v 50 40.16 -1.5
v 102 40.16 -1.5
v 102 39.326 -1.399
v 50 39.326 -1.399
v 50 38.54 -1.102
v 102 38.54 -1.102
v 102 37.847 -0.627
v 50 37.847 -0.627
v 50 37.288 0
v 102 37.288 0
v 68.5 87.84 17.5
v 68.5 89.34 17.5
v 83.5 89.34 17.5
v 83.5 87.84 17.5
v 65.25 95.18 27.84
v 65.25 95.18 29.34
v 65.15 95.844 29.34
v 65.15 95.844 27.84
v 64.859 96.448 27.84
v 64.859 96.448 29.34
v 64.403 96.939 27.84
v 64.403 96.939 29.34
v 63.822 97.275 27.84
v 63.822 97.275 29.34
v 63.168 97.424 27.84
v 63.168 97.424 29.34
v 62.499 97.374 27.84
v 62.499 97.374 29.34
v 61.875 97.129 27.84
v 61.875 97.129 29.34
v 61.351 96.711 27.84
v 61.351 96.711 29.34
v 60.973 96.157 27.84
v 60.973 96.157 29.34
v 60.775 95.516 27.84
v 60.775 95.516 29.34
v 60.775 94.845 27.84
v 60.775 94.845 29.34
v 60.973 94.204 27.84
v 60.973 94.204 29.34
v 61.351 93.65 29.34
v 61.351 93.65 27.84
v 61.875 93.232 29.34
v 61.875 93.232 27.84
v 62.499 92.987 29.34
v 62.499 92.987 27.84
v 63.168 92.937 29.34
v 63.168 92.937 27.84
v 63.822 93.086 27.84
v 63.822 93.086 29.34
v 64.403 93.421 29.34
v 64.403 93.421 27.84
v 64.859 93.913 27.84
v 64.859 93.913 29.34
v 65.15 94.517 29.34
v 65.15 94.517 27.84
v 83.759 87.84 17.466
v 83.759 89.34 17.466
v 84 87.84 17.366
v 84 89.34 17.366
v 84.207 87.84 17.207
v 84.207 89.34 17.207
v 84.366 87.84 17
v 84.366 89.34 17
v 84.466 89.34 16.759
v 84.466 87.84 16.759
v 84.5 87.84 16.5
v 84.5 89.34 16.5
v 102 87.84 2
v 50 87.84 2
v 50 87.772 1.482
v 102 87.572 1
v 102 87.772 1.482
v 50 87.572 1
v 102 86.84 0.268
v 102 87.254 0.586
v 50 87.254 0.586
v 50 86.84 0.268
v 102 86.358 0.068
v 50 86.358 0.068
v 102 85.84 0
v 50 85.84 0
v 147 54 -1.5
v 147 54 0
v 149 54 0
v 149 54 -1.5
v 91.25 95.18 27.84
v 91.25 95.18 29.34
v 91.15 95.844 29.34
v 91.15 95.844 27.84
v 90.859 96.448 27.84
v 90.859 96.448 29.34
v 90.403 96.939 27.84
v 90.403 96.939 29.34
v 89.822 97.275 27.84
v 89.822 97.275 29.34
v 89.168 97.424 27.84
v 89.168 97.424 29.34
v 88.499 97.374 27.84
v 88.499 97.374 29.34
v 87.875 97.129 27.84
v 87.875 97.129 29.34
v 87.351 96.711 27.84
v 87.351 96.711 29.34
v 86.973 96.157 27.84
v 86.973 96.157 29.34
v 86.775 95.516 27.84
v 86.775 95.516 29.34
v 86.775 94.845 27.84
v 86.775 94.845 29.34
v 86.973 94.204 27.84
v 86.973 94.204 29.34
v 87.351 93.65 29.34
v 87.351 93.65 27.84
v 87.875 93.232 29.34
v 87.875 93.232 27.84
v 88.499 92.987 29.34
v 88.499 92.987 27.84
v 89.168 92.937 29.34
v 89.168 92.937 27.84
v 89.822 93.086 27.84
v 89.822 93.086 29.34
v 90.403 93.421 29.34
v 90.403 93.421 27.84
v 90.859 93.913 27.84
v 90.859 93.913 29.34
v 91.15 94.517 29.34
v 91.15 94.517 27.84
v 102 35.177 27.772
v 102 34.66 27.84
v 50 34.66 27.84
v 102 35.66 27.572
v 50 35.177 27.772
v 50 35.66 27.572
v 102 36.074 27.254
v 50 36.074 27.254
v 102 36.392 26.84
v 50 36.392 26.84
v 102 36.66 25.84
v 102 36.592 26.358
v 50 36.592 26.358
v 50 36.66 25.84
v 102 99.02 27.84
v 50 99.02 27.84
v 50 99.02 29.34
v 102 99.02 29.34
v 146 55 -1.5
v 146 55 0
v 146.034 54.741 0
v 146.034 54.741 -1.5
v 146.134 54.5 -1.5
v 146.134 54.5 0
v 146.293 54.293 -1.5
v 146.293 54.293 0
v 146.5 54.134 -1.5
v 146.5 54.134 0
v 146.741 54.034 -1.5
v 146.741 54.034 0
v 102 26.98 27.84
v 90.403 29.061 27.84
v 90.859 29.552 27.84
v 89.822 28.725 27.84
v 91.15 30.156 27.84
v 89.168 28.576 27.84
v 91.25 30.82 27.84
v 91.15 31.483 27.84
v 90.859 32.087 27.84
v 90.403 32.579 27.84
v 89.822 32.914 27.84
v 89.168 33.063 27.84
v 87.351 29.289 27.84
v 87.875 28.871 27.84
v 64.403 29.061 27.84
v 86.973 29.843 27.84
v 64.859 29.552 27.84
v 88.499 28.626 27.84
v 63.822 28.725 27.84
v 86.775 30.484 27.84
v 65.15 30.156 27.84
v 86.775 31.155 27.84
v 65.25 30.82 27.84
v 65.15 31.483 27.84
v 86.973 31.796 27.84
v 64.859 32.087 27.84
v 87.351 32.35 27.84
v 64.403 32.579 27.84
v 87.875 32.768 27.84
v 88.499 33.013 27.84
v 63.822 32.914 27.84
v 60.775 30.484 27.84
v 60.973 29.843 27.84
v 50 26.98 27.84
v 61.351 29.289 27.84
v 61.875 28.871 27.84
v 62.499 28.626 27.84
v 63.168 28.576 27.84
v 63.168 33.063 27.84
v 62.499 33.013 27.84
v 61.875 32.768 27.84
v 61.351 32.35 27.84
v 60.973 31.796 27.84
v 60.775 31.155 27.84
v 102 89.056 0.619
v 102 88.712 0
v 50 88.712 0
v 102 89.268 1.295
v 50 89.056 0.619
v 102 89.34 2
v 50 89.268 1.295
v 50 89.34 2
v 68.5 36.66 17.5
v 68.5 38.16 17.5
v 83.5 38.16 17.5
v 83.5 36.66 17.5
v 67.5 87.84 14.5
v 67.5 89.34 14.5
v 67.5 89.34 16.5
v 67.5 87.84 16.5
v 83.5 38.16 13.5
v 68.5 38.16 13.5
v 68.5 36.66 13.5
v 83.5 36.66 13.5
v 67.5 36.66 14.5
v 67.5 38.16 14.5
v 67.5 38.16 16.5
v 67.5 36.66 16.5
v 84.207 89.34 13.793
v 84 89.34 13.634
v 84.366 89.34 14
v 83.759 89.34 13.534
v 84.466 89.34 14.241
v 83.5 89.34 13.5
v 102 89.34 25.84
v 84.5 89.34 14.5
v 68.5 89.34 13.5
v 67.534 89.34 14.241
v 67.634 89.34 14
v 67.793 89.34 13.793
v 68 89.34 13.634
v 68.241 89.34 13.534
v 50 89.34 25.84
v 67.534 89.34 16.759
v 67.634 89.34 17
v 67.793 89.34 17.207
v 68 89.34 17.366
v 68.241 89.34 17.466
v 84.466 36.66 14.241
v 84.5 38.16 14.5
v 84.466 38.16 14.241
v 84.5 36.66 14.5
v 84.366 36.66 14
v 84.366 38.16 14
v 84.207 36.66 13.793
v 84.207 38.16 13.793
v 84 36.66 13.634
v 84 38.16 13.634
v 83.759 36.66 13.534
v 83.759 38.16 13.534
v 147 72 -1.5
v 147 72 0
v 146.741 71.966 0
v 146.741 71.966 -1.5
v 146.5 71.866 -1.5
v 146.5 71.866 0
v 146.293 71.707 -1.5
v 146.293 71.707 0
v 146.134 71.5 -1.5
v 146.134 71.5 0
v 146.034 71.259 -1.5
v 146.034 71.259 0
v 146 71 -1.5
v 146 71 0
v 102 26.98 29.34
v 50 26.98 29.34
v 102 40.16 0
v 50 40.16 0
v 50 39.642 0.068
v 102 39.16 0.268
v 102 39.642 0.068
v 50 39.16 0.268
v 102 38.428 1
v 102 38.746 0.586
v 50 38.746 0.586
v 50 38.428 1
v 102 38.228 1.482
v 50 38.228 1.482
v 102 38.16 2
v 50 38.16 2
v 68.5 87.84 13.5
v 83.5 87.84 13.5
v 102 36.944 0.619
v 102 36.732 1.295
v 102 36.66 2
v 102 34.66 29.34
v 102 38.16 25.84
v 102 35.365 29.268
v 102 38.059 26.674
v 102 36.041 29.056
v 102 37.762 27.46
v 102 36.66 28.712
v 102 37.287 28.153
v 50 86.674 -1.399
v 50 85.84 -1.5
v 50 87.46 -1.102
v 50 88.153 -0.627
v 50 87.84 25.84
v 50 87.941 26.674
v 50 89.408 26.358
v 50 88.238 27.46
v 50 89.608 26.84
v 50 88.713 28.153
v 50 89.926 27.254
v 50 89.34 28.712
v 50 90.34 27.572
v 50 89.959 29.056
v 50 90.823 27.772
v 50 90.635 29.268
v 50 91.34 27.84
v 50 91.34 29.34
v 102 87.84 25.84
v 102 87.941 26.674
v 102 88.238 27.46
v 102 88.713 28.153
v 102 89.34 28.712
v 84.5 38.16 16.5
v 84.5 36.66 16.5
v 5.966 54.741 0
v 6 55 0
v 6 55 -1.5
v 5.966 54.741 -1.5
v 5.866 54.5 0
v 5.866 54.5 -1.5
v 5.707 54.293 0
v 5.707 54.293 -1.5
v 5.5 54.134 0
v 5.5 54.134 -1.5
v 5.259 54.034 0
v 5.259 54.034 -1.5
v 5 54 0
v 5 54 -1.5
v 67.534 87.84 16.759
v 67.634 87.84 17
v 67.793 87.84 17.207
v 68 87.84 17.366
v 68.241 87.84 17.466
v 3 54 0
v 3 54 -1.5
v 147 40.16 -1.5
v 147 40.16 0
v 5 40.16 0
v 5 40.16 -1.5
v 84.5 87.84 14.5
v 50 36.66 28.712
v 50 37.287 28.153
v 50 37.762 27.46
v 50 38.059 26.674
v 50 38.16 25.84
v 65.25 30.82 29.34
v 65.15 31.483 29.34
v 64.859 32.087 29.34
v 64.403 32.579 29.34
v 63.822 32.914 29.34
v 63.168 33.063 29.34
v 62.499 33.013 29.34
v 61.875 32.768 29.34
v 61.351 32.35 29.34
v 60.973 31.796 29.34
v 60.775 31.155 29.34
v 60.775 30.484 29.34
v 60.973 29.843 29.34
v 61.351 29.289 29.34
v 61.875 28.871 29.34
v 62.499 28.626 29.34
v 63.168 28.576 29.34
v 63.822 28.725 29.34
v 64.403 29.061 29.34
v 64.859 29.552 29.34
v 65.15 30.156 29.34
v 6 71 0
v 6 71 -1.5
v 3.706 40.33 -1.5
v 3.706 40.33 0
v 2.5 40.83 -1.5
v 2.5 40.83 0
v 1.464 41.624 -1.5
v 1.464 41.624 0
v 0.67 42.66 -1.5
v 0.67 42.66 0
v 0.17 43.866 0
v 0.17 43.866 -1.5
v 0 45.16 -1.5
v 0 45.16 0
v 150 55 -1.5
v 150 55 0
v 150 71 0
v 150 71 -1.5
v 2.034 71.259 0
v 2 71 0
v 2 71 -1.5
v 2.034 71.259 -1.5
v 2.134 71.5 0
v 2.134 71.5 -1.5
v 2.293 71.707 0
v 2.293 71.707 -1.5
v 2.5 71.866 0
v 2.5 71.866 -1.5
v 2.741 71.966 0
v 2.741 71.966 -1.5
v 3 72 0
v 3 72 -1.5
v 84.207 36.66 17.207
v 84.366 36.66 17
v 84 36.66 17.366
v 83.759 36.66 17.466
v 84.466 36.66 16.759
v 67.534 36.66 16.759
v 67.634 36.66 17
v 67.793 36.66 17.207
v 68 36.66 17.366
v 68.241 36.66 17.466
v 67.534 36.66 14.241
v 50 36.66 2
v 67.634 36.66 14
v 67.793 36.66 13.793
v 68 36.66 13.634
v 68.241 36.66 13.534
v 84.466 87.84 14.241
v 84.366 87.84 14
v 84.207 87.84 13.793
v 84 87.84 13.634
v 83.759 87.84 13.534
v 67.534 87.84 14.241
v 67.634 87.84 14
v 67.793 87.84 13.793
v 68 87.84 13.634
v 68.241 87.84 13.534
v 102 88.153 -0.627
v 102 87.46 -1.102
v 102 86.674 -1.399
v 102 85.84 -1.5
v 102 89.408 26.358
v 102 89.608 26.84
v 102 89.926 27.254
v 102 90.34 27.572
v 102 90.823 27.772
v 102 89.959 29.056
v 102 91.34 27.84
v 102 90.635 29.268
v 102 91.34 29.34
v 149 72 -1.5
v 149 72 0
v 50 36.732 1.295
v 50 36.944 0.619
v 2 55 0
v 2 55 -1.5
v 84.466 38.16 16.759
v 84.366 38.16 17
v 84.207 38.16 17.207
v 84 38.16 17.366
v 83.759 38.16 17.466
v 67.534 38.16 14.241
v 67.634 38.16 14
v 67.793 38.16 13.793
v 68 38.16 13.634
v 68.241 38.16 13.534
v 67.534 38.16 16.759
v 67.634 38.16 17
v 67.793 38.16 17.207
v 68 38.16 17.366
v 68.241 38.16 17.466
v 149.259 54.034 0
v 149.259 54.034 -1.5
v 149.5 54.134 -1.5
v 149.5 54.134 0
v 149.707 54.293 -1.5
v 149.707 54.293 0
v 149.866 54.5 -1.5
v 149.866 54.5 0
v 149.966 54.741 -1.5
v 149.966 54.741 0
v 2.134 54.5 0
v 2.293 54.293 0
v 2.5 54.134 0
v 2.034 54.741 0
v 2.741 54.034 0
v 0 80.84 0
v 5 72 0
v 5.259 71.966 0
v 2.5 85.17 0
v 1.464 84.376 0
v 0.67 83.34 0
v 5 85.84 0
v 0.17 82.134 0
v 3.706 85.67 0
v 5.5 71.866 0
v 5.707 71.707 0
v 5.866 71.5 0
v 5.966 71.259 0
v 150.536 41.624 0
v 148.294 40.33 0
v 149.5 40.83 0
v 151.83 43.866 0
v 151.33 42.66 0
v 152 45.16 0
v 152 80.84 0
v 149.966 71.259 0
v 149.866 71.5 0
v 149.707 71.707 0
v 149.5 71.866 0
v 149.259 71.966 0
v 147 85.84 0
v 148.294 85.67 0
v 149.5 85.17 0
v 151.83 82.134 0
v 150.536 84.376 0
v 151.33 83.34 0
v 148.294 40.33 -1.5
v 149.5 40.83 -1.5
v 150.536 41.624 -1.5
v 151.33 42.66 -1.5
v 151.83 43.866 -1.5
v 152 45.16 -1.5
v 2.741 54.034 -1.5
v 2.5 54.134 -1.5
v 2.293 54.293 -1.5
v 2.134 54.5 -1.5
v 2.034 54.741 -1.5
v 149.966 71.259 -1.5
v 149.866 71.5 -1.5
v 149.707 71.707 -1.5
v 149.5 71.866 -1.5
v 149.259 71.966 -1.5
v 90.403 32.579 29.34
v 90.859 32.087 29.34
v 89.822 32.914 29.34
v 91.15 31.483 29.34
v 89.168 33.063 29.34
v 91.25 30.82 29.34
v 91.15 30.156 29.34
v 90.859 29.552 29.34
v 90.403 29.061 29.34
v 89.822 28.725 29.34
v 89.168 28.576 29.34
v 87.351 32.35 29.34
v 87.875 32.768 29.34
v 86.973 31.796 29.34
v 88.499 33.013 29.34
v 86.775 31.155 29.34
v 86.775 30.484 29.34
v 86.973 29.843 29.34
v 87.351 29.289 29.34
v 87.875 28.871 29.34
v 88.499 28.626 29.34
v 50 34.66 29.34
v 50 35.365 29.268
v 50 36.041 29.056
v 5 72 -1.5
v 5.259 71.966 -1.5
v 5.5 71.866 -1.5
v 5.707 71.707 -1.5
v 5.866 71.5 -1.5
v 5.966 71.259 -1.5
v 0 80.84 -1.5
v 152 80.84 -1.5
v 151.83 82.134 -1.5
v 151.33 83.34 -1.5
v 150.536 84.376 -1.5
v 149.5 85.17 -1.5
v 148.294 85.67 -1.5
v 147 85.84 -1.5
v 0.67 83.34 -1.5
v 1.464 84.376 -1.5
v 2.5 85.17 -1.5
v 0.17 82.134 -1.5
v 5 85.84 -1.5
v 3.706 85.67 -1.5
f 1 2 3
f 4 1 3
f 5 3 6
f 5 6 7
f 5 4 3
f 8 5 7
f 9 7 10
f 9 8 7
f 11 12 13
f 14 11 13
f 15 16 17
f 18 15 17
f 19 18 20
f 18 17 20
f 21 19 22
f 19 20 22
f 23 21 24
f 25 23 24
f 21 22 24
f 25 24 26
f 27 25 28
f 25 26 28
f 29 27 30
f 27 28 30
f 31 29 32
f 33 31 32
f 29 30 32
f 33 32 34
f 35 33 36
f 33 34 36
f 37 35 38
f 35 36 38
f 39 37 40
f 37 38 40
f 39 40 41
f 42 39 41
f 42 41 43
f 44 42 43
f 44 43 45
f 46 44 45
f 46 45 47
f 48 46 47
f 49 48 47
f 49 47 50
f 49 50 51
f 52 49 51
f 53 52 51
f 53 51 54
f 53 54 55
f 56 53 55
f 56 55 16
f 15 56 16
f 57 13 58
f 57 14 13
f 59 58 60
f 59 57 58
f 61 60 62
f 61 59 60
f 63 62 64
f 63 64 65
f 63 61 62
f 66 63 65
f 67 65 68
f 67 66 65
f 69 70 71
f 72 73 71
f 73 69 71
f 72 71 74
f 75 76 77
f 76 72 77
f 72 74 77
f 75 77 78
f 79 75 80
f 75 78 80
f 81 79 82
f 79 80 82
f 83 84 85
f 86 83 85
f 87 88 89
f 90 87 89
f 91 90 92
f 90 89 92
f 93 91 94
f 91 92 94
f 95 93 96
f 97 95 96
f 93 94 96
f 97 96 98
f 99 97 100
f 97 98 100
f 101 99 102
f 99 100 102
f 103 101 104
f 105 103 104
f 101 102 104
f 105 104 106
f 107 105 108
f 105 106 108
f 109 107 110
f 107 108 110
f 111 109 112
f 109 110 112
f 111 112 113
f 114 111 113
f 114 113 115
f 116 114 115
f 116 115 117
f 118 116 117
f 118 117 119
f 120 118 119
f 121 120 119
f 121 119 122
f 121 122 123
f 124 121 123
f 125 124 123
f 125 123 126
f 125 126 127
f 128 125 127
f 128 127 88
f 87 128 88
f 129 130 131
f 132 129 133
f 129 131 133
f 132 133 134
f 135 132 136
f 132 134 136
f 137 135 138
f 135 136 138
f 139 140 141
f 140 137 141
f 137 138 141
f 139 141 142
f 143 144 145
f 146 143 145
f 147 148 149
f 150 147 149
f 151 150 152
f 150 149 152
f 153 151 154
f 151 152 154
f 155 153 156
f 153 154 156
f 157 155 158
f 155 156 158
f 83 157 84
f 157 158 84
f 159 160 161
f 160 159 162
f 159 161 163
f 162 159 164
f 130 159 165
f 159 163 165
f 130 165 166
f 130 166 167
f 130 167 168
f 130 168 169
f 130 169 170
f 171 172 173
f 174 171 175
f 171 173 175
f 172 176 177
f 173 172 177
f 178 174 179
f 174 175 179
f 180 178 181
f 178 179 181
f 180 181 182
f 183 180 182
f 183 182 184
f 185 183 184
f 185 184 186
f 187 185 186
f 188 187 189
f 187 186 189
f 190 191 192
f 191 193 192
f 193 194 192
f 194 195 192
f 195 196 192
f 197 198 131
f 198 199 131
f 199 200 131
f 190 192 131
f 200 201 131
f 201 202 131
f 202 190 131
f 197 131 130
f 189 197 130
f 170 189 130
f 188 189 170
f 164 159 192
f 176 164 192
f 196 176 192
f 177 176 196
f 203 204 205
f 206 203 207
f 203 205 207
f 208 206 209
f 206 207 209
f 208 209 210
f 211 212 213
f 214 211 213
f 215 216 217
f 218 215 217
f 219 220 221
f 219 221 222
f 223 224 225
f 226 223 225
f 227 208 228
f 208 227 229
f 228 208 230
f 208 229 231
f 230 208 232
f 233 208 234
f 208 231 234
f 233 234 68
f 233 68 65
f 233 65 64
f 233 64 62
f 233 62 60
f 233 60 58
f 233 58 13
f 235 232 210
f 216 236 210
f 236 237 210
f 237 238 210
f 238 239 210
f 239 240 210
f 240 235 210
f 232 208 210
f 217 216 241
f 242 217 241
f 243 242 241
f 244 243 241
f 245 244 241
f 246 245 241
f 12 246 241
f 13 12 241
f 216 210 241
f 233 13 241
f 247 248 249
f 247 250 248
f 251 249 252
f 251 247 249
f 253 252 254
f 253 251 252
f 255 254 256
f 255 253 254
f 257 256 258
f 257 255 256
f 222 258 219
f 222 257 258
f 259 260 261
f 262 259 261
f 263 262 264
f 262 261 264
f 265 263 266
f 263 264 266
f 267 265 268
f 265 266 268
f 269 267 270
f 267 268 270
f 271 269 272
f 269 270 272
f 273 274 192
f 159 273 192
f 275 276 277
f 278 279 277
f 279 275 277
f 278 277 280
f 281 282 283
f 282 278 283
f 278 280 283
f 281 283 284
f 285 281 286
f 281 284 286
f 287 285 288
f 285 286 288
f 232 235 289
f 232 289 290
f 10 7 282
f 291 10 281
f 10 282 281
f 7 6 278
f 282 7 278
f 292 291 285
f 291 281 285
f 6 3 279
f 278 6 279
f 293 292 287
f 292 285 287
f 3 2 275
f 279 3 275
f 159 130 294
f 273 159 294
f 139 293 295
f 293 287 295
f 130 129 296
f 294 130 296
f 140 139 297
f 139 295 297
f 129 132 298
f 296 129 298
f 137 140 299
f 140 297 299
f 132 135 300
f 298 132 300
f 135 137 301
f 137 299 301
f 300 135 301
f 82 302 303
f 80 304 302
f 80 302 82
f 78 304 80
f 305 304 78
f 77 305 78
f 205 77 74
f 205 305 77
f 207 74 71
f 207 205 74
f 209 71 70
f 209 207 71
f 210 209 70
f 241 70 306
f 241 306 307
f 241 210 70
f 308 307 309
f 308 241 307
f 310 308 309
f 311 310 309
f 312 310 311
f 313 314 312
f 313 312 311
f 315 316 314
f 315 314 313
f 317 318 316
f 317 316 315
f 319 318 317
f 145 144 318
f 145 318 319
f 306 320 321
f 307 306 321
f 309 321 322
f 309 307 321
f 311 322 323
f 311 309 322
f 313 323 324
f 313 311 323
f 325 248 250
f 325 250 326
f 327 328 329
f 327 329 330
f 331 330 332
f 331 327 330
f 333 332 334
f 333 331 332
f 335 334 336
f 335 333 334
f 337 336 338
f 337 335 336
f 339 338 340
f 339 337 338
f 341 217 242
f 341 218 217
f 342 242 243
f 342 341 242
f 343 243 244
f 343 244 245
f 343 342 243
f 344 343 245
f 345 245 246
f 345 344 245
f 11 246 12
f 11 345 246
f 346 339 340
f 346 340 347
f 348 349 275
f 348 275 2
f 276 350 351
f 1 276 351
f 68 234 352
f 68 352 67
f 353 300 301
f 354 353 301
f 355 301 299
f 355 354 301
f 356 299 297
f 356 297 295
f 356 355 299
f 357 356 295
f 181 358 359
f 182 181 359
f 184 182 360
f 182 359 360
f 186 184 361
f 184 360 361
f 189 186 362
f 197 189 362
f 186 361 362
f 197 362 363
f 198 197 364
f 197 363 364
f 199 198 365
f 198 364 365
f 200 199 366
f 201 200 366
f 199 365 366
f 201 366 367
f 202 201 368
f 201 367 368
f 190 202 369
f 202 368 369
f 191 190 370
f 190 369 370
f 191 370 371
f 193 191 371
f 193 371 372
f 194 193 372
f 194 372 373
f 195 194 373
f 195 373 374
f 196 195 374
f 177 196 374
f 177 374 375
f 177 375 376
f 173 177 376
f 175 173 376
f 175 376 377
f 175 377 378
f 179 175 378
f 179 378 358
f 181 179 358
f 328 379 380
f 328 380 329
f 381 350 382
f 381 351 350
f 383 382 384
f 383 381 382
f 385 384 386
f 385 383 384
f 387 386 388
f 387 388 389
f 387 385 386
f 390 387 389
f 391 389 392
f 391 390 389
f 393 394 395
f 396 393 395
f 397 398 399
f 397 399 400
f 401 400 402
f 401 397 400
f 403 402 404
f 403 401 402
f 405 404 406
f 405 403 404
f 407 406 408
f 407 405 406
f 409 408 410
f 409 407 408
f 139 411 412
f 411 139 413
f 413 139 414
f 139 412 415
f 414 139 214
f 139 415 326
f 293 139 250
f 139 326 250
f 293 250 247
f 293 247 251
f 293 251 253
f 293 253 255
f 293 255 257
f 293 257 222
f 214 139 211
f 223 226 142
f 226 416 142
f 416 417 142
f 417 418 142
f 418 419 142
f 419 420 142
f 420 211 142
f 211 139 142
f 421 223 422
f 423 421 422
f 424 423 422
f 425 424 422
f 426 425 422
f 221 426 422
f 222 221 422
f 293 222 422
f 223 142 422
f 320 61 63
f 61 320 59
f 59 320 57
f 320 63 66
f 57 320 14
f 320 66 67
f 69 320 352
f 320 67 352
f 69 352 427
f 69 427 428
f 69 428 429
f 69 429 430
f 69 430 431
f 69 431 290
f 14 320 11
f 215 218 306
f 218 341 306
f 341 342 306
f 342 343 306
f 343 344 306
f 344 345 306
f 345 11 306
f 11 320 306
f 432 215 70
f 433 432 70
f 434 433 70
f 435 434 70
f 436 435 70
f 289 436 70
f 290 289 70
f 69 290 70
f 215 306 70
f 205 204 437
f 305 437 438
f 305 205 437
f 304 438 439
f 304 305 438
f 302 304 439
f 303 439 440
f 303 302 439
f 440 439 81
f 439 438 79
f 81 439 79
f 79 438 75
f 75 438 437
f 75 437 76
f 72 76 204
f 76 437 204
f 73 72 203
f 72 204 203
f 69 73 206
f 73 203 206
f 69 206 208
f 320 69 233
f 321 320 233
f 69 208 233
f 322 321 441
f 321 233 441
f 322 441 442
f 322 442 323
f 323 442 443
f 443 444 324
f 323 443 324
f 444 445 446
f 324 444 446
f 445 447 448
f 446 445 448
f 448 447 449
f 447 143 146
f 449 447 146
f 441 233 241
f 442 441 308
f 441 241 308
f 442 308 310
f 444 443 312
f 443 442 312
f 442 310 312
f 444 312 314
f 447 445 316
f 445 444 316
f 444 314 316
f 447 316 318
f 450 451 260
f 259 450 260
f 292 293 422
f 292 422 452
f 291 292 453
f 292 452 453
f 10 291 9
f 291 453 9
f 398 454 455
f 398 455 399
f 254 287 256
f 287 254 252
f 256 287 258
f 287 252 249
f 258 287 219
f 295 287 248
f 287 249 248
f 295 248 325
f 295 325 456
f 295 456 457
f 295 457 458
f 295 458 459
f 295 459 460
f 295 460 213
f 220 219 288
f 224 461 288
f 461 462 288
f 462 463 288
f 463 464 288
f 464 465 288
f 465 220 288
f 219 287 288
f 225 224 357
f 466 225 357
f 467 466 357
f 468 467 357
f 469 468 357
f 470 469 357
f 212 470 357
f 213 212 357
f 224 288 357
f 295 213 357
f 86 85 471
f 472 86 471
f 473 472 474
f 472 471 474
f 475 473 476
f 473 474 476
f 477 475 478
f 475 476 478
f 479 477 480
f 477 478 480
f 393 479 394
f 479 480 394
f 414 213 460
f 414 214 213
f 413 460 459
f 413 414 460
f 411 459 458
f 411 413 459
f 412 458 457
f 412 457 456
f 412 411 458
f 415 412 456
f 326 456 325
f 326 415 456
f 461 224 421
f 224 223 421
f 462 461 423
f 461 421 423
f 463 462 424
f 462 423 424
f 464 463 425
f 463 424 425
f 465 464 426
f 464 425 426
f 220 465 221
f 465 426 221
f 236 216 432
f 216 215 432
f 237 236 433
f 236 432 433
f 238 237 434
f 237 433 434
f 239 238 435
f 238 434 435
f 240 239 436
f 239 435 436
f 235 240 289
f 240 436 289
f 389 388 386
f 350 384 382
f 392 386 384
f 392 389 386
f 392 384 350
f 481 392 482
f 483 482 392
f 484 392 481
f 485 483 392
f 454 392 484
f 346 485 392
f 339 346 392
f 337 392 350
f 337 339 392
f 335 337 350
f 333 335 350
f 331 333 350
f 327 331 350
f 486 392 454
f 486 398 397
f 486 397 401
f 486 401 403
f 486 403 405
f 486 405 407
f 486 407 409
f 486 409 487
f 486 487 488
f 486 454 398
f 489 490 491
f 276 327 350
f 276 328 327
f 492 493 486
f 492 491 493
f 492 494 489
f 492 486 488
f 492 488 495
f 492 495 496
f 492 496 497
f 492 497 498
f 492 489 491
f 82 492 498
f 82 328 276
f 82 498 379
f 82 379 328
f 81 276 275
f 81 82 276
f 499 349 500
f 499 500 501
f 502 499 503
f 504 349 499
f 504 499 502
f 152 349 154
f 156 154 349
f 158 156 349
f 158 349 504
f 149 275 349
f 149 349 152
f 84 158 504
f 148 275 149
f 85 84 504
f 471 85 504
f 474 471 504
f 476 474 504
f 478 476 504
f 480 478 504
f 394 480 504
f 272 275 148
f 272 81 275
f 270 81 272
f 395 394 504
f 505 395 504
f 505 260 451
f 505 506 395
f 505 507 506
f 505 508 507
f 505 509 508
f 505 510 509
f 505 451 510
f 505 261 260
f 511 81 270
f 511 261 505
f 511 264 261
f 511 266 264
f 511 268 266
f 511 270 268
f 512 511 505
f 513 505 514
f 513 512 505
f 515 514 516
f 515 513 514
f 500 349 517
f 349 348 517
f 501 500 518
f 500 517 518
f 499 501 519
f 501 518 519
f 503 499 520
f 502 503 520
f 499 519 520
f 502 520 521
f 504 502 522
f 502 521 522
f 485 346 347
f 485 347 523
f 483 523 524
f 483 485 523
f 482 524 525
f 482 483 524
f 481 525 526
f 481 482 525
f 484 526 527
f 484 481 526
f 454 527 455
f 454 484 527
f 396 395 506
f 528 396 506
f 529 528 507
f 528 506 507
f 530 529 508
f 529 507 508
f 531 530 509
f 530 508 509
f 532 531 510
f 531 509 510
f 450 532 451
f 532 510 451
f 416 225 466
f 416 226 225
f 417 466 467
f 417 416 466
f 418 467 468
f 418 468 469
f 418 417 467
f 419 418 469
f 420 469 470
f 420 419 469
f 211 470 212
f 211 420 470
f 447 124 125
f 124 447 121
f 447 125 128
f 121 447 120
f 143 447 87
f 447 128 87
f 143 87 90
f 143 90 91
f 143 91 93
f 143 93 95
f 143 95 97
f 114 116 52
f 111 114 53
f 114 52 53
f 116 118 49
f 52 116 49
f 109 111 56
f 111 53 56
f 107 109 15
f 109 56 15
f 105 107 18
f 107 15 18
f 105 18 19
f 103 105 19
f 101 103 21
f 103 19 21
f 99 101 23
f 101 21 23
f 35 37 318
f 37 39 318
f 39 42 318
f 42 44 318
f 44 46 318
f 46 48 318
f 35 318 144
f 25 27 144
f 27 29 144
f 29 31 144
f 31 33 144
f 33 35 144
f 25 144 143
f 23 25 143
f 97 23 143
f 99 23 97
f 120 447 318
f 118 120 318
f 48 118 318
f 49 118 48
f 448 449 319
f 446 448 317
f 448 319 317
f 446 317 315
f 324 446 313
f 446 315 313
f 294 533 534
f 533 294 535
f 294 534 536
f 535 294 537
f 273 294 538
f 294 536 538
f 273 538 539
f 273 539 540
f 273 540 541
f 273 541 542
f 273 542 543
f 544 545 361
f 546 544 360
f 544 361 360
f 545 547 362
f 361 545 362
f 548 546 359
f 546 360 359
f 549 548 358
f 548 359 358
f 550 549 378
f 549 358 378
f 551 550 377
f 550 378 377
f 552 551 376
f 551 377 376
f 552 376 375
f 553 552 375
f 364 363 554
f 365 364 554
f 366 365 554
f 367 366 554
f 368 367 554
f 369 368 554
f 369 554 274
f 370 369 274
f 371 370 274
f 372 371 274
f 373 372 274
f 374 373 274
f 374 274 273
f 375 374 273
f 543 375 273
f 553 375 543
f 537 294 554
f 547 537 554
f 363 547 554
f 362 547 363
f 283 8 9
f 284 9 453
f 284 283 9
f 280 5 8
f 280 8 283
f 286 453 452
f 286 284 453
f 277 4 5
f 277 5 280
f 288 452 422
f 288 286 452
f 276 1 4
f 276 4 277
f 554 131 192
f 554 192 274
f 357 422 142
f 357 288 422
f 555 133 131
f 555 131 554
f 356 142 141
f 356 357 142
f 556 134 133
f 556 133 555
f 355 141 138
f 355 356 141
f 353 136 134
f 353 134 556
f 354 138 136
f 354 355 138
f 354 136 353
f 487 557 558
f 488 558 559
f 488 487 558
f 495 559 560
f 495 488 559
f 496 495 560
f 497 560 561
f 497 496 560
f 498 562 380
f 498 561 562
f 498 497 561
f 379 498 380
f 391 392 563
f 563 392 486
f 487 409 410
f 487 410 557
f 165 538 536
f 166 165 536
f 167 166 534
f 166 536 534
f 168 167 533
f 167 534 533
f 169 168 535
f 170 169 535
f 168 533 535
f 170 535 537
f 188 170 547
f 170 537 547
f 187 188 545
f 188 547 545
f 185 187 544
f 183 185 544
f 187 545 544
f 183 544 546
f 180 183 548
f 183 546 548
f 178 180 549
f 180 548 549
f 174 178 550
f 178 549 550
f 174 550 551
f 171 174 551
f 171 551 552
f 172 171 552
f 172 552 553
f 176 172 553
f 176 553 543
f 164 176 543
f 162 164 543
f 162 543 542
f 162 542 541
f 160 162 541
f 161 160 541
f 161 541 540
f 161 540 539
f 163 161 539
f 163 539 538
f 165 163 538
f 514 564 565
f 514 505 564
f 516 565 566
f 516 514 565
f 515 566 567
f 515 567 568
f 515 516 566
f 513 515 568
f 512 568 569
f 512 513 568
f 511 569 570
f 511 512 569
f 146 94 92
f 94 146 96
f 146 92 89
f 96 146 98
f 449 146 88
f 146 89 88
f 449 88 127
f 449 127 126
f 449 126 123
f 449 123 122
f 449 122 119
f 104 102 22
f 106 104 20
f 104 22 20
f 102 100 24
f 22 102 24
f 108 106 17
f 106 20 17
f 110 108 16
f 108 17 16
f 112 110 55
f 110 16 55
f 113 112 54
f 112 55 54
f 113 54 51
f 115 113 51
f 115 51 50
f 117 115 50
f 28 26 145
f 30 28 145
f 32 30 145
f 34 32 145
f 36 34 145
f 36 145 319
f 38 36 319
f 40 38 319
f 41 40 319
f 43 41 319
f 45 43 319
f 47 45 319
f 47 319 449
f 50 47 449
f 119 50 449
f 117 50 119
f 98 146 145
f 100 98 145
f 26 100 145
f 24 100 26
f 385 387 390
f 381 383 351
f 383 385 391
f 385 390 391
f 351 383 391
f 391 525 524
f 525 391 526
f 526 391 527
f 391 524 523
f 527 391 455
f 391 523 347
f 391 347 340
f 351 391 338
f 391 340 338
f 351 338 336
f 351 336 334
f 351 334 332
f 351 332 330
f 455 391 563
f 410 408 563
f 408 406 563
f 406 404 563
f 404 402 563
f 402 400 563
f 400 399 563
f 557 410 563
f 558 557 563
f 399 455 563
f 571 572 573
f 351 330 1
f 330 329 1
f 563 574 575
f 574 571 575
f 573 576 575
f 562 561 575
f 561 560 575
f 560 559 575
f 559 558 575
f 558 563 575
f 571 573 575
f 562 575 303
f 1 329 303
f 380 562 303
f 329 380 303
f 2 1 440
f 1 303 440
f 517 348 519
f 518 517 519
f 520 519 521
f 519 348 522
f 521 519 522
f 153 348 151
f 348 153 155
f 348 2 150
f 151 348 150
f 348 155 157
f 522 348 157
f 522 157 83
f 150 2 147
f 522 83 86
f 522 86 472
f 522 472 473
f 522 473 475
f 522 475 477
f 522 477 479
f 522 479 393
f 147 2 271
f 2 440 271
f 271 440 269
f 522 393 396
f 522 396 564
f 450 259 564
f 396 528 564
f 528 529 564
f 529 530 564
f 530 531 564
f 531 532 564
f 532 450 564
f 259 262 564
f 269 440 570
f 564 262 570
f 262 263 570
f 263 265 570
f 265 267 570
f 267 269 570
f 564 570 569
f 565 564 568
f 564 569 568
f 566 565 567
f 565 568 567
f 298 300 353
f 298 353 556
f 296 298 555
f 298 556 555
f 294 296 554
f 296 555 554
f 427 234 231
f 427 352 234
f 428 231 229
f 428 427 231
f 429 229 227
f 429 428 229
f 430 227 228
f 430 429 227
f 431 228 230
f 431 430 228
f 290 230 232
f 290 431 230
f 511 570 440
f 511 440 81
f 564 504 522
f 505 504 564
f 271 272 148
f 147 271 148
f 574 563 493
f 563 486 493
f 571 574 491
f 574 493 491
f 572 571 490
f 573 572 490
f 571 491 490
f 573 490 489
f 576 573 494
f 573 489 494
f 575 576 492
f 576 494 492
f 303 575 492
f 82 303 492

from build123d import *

# Parameters (mm, degrees)
SKIZZE1_W                            = 152
SKIZZE1_H                            = 126
BASIS_BLECH1_DEPTH                   = 1.5
SKIZZIERTE_BIEGUNG2_DEPTH            = 152
SKIZZIERTE_BIEGUNG2_2_DEPTH          = 152
SKIZZIERTE_BIEGUNG3_DEPTH            = 152
SKIZZIERTE_BIEGUNG3_2_DEPTH          = 152
SKIZZIERTE_BIEGUNG4_DEPTH            = 152
SKIZZIERTE_BIEGUNG4_2_DEPTH          = 152
SCHNITT_LINEAR_AUSTRAGEN1_DEPTH      = 50
SCHNITT_LINEAR_AUSTRAGEN2_DEPTH      = 167.894252898
SCHNITT_LINEAR_AUSTRAGEN2_DEPTH_BACK = 167.894252898
SKIZZE15_W                           = 17
SKIZZE15_H                           = 4
SKIZZE22_R                           = 2.25
SCHNITT_LINEAR_AUSTRAGEN4_DEPTH      = 185.011324876
VERRUNDUNG3_R                        = 1
VERRUNDUNG4_R                        = 5
SCHNITT_LINEAR_AUSTRAGEN5_DEPTH      = 184.765876096


# Read off the part's stored shape, not the designer's step: Skizzierte Biegung2, Skizzierte Biegung3, Skizzierte Biegung4
# Sheet-metal steps are written as plain solids
with BuildPart() as part:
    # Skizze1 → Basis-Blech1 (new body)
    with BuildSketch(Plane.XY):
        with Locations((76, 63)):
            Rectangle(SKIZZE1_W, SKIZZE1_H)
    extrude(amount=-BASIS_BLECH1_DEPTH)

    # Skizzierte Biegung2 outline → Skizzierte Biegung2 (cut)
    with BuildSketch(Plane.YZ):
        with BuildLine():
            ThreePointArc((88.712436374, 0), (87.460340225, -1.102418411), (85.840155051, -1.5))
            Line((85.840155051, -1.5), (126, -1.5))
            Line((126, -1.5), (126, 0))
            Line((126, 0), (88.712436374, 0))
        make_face()
        with BuildLine():
            Line((0, -1.5), (40.159844949, -1.5))
            ThreePointArc((40.159844949, -1.5), (38.539659775, -1.102418411), (37.287563626, 0))
            Line((37.287563626, 0), (0, 0))
            Line((0, 0), (0, -1.5))
        make_face()
    extrude(amount=SKIZZIERTE_BIEGUNG2_DEPTH, mode=Mode.SUBTRACT)

    # Skizzierte Biegung2 2 outline → Skizzierte Biegung2 2 (add)
    with BuildSketch(Plane.YZ):
        with BuildLine():
            Line((85.840155051, 0), (88.712436374, 0))
            ThreePointArc((88.712436374, 0), (89.179540071, 0.951902827), (89.340155051, 2))
            Line((89.340155051, 2), (89.340155051, 37.840155051))
            Line((89.340155051, 37.840155051), (87.840155051, 37.840155051))
            Line((87.840155051, 37.840155051), (87.840155051, 2))
            ThreePointArc((87.840155051, 2), (87.254368613, 0.585786438), (85.840155051, 0))
        make_face()
        with BuildLine():
            ThreePointArc((36.659844949, 2), (36.820459929, 0.951902827), (37.287563626, 0))
            Line((37.287563626, 0), (40.159844949, 0))
            ThreePointArc((40.159844949, 0), (38.745631387, 0.585786438), (38.159844949, 2))
            Line((38.159844949, 2), (38.159844949, 37.840155051))
            Line((38.159844949, 37.840155051), (36.659844949, 37.840155051))
            Line((36.659844949, 37.840155051), (36.659844949, 2))
        make_face()
    extrude(amount=SKIZZIERTE_BIEGUNG2_2_DEPTH)

    # Skizzierte Biegung3 outline → Skizzierte Biegung3 (cut)
    with BuildSketch(Plane.YZ):
        with BuildLine():
            ThreePointArc((87.840155051, 25.840155051), (88.23773664, 27.460340225), (89.340155051, 28.712436374))
            Line((89.340155051, 28.712436374), (89.340155051, 37.840155051))
            Line((89.340155051, 37.840155051), (87.840155051, 37.840155051))
            Line((87.840155051, 37.840155051), (87.840155051, 25.840155051))
        make_face()
    extrude(amount=SKIZZIERTE_BIEGUNG3_DEPTH, mode=Mode.SUBTRACT)

    # Skizzierte Biegung3 2 outline → Skizzierte Biegung3 2 (add)
    with BuildSketch(Plane.YZ):
        with BuildLine():
            ThreePointArc((89.340155051, 25.840155051), (89.925941489, 27.254368613), (91.340155051, 27.840155051))
            Line((91.340155051, 27.840155051), (99.020465152, 27.840155051))
            Line((99.020465152, 27.840155051), (99.020465152, 29.340155051))
            Line((99.020465152, 29.340155051), (91.340155051, 29.340155051))
            ThreePointArc((91.340155051, 29.340155051), (90.292057878, 29.179540071), (89.340155051, 28.712436374))
            Line((89.340155051, 28.712436374), (89.340155051, 25.840155051))
        make_face()
    extrude(amount=SKIZZIERTE_BIEGUNG3_2_DEPTH)

    # Skizzierte Biegung4 outline → Skizzierte Biegung4 (cut)
    with BuildSketch(Plane.YZ):
        with BuildLine():
            Line((36.659844949, 37.840155051), (36.659844949, 28.712436374))
            ThreePointArc((36.659844949, 28.712436374), (37.76226336, 27.460340225), (38.159844949, 25.840155051))
            Line((38.159844949, 25.840155051), (38.159844949, 37.840155051))
            Line((38.159844949, 37.840155051), (36.659844949, 37.840155051))
        make_face()
    extrude(amount=SKIZZIERTE_BIEGUNG4_DEPTH, mode=Mode.SUBTRACT)

    # Skizzierte Biegung4 2 outline → Skizzierte Biegung4 2 (add)
    with BuildSketch(Plane.YZ):
        with BuildLine():
            Line((26.979534848, 29.340155051), (26.979534848, 27.840155051))
            Line((26.979534848, 27.840155051), (34.659844949, 27.840155051))
            ThreePointArc((34.659844949, 27.840155051), (36.074058511, 27.254368614), (36.659844949, 25.840155051))
            Line((36.659844949, 25.840155051), (36.659844949, 28.712436374))
            ThreePointArc((36.659844949, 28.712436374), (35.707942122, 29.179540071), (34.659844949, 29.340155051))
            Line((34.659844949, 29.340155051), (26.979534848, 29.340155051))
        make_face()
    extrude(amount=SKIZZIERTE_BIEGUNG4_2_DEPTH)

    # Skizze14 → Schnitt-Linear austragen1 (cut)
    with BuildSketch(Plane.ZY):
        with BuildLine():
            Line((29.340155051, 91.340155051), (29.340155051, 99.020465152))
            Line((29.340155051, 99.020465152), (27.840155051, 99.020465152))
            Line((27.840155051, 99.020465152), (27.840155051, 91.340155051))
            ThreePointArc((27.840155051, 91.340155051), (27.254368613, 89.925941488), (25.840155051, 89.340155051))
            Line((25.840155051, 89.340155051), (2, 89.340155051))
            ThreePointArc((2, 89.340155051), (-0.474873734, 88.315028785), (-1.5, 85.840155051))
            Line((-1.5, 85.840155051), (0, 85.840155051))
            ThreePointArc((0, 85.840155051), (0.585786438, 87.254368613), (2, 87.840155051))
            Line((2, 87.840155051), (25.840155051, 87.840155051))
            ThreePointArc((25.840155051, 87.840155051), (28.315028785, 88.865281317), (29.340155051, 91.340155051))
        make_face()
        with BuildLine():
            Line((0, 40.159844949), (-1.5, 40.159844949))
            ThreePointArc((-1.5, 40.159844949), (-0.474873734, 37.684971215), (2, 36.659844949))
            Line((2, 36.659844949), (25.840155051, 36.659844949))
            ThreePointArc((25.840155051, 36.659844949), (27.254368613, 36.074058512), (27.840155051, 34.659844949))
            Line((27.840155051, 34.659844949), (27.840155051, 26.979534848))
            Line((27.840155051, 26.979534848), (29.340155051, 26.979534848))
            Line((29.340155051, 26.979534848), (29.340155051, 34.659844949))
            ThreePointArc((29.340155051, 34.659844949), (28.315028785, 37.134718683), (25.840155051, 38.159844949))
            Line((25.840155051, 38.159844949), (2, 38.159844949))
            ThreePointArc((2, 38.159844949), (0.585786438, 38.745631387), (0, 40.159844949))
        make_face()
    schnitt_linear_austragen1 = extrude(amount=-SCHNITT_LINEAR_AUSTRAGEN1_DEPTH, mode=Mode.SUBTRACT)

    # Spiegeln1: Schnitt-Linear austragen1 across plane
    add(schnitt_linear_austragen1.mirror(Plane(origin=(76, 0, 0), x_dir=(0, 0, 1), z_dir=(1, 0, 0))), mode=Mode.SUBTRACT)

    # Skizze15 → Schnitt-Linear austragen2 (cut, two sides: drawn at the far end of the back side and taken through both)
    with BuildSketch(Plane.XZ.offset(-36.659844949).offset(-SCHNITT_LINEAR_AUSTRAGEN2_DEPTH_BACK)):
        with Locations((76, 15.5)):
            Rectangle(SKIZZE15_W, SKIZZE15_H)
    extrude(amount=SCHNITT_LINEAR_AUSTRAGEN2_DEPTH + SCHNITT_LINEAR_AUSTRAGEN2_DEPTH_BACK, mode=Mode.SUBTRACT)

    # Skizze22 → Schnitt-Linear austragen4 (cut, through all)
    with BuildSketch(Plane.XY.offset(29.340155051)):
        with Locations((63, 95.180310101)):
            Circle(SKIZZE22_R)
        with Locations((89, 95.180310101)):
            Circle(SKIZZE22_R)
        with Locations((63, 30.819689899)):
            Circle(SKIZZE22_R)
        with Locations((89, 30.819689899)):
            Circle(SKIZZE22_R)
    extrude(amount=-SCHNITT_LINEAR_AUSTRAGEN4_DEPTH, mode=Mode.SUBTRACT)

    # Verrundung3
    verrundung3_edges = [part.edges().sort_by_distance(p)[0] for p in [
        (67.5, 88.590155051, 13.5),
        (67.5, 37.409844949, 13.5),
        (67.5, 88.590155051, 17.5),
        (67.5, 37.409844949, 17.5),
        (84.5, 88.590155051, 17.5),
        (84.5, 37.409844949, 17.5),
        (84.5, 88.590155051, 13.5),
        (84.5, 37.409844949, 13.5),
    ]]
    fillet(verrundung3_edges, radius=VERRUNDUNG3_R)

    # Verrundung4
    verrundung4_edges = [part.edges().sort_by_distance(p)[0] for p in [
        (0, 85.840155051, -0.75),
        (152, 85.840155051, -0.75),
        (152, 40.159844949, -0.75),
        (0, 40.159844949, -0.75),
    ]]
    fillet(verrundung4_edges, radius=VERRUNDUNG4_R)

    # Skizze23 → Schnitt-Linear austragen5 (cut, through all)
    with BuildSketch(Plane.XY):
        with BuildLine():
            Line((3, 72), (5, 72))
            ThreePointArc((5, 72), (5.707106781, 71.707106781), (6, 71))
            Line((6, 71), (6, 55))
            ThreePointArc((6, 55), (5.707106781, 54.292893219), (5, 54))
            Line((5, 54), (3, 54))
            ThreePointArc((3, 54), (2.292893219, 54.292893219), (2, 55))
            Line((2, 55), (2, 71))
            ThreePointArc((2, 71), (2.292893219, 71.707106781), (3, 72))
        make_face()
        with BuildLine():
            Line((149, 72), (147, 72))
            ThreePointArc((147, 72), (146.292893219, 71.707106781), (146, 71))
            Line((146, 71), (146, 55))
            ThreePointArc((146, 55), (146.292893219, 54.292893219), (147, 54))
            Line((147, 54), (149, 54))
            ThreePointArc((149, 54), (149.707106781, 54.292893219), (150, 55))
            Line((150, 55), (150, 71))
            ThreePointArc((150, 71), (149.707106781, 71.707106781), (149, 72))
        make_face()
    extrude(amount=-SCHNITT_LINEAR_AUSTRAGEN5_DEPTH, mode=Mode.SUBTRACT)


solid = part.part
